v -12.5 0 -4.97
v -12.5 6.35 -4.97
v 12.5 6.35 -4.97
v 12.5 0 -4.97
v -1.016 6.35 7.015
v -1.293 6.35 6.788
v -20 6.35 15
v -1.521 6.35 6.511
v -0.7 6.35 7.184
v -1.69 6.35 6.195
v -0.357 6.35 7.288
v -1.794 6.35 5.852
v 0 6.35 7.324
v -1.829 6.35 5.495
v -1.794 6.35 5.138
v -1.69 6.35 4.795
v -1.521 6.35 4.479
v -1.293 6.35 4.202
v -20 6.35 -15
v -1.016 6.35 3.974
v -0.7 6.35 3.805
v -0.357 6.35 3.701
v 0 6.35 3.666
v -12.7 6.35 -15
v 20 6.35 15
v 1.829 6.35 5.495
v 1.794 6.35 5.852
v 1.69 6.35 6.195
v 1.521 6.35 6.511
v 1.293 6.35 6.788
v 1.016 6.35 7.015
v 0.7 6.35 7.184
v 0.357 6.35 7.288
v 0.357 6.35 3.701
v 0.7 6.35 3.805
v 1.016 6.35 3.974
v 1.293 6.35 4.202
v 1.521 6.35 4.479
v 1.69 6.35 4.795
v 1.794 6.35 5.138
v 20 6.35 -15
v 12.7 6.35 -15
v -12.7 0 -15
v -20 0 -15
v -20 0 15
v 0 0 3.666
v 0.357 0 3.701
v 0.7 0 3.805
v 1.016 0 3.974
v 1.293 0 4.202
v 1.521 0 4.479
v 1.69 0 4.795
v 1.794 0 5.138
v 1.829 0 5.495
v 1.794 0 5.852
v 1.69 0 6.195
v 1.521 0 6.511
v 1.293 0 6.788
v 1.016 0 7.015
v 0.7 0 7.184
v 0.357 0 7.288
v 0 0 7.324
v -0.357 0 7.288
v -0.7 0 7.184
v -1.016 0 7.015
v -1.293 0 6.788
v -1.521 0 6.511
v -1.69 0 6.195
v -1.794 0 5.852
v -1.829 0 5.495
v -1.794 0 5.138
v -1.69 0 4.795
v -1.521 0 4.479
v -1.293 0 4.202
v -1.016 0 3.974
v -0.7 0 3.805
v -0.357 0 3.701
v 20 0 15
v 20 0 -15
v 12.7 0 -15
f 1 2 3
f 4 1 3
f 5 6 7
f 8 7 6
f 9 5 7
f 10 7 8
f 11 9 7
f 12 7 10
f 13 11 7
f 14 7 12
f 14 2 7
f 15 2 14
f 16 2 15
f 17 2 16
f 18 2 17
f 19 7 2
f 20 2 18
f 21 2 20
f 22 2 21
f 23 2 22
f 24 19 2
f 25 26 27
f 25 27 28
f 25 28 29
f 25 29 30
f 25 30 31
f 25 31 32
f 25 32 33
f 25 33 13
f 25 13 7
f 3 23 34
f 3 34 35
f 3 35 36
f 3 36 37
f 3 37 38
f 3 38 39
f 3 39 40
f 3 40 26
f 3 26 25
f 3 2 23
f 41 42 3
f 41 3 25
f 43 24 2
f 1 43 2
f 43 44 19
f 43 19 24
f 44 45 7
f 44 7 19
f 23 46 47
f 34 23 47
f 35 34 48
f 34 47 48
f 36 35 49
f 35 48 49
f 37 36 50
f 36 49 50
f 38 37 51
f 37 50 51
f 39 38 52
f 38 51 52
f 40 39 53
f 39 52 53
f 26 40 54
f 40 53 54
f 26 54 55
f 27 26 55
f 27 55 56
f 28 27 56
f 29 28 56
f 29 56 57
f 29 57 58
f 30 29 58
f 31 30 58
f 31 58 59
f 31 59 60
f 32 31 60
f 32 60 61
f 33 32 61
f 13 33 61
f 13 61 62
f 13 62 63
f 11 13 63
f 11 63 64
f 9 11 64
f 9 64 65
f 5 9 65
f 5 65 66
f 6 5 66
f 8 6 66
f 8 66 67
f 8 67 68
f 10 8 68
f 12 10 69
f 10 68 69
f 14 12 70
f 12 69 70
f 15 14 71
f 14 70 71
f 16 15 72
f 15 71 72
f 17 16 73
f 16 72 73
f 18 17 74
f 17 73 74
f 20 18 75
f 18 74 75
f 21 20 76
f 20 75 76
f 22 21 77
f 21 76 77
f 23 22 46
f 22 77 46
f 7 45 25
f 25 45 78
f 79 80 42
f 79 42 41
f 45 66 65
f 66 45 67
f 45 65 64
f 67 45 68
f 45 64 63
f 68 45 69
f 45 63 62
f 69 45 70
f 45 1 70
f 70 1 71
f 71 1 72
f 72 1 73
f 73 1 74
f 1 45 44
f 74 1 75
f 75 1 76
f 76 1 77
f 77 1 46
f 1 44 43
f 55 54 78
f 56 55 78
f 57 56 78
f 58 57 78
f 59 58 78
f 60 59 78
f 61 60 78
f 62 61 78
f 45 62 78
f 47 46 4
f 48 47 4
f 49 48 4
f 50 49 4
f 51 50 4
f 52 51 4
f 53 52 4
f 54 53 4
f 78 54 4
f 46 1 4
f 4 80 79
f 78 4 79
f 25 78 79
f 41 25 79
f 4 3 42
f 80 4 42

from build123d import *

# Parameters (mm, degrees)
SKETCH1_W             = 40
SKETCH1_H             = 30
BOSS_EXTRUDE1_DEPTH   = 6.35
CUT_EXTRUDE1_DEPTH    = 7.35
F_6_CLEARANCE_HOLE1_D = 3.6576


with BuildPart() as part:
    # Sketch1 → Boss-Extrude1 (new body)
    with BuildSketch(Plane(origin=(0, 0, 0), x_dir=(1, 0, 0), z_dir=(0, 1, 0))):
        Rectangle(SKETCH1_W, SKETCH1_H)
    extrude(amount=BOSS_EXTRUDE1_DEPTH)

    # Sketch2 → Cut-Extrude1 (cut, through all)
    with BuildSketch(Plane(origin=(0, 6.35, 0), x_dir=(1, 0, 0), z_dir=(0, 1, 0))):
        Polygon((-12.7, 15), (-12.5, 4.97), (12.5, 4.97), (12.7, 15), align=None)
    extrude(amount=-CUT_EXTRUDE1_DEPTH, mode=Mode.SUBTRACT)

    # #6 Clearance Hole1 (through all)
    with Locations(Plane(origin=(0, 6.35, 5.4948), x_dir=(0, 0, 1), z_dir=(0, 1, 0))):
        with Locations((0, 0)):
            Hole(F_6_CLEARANCE_HOLE1_D / 2)


solid = part.part
